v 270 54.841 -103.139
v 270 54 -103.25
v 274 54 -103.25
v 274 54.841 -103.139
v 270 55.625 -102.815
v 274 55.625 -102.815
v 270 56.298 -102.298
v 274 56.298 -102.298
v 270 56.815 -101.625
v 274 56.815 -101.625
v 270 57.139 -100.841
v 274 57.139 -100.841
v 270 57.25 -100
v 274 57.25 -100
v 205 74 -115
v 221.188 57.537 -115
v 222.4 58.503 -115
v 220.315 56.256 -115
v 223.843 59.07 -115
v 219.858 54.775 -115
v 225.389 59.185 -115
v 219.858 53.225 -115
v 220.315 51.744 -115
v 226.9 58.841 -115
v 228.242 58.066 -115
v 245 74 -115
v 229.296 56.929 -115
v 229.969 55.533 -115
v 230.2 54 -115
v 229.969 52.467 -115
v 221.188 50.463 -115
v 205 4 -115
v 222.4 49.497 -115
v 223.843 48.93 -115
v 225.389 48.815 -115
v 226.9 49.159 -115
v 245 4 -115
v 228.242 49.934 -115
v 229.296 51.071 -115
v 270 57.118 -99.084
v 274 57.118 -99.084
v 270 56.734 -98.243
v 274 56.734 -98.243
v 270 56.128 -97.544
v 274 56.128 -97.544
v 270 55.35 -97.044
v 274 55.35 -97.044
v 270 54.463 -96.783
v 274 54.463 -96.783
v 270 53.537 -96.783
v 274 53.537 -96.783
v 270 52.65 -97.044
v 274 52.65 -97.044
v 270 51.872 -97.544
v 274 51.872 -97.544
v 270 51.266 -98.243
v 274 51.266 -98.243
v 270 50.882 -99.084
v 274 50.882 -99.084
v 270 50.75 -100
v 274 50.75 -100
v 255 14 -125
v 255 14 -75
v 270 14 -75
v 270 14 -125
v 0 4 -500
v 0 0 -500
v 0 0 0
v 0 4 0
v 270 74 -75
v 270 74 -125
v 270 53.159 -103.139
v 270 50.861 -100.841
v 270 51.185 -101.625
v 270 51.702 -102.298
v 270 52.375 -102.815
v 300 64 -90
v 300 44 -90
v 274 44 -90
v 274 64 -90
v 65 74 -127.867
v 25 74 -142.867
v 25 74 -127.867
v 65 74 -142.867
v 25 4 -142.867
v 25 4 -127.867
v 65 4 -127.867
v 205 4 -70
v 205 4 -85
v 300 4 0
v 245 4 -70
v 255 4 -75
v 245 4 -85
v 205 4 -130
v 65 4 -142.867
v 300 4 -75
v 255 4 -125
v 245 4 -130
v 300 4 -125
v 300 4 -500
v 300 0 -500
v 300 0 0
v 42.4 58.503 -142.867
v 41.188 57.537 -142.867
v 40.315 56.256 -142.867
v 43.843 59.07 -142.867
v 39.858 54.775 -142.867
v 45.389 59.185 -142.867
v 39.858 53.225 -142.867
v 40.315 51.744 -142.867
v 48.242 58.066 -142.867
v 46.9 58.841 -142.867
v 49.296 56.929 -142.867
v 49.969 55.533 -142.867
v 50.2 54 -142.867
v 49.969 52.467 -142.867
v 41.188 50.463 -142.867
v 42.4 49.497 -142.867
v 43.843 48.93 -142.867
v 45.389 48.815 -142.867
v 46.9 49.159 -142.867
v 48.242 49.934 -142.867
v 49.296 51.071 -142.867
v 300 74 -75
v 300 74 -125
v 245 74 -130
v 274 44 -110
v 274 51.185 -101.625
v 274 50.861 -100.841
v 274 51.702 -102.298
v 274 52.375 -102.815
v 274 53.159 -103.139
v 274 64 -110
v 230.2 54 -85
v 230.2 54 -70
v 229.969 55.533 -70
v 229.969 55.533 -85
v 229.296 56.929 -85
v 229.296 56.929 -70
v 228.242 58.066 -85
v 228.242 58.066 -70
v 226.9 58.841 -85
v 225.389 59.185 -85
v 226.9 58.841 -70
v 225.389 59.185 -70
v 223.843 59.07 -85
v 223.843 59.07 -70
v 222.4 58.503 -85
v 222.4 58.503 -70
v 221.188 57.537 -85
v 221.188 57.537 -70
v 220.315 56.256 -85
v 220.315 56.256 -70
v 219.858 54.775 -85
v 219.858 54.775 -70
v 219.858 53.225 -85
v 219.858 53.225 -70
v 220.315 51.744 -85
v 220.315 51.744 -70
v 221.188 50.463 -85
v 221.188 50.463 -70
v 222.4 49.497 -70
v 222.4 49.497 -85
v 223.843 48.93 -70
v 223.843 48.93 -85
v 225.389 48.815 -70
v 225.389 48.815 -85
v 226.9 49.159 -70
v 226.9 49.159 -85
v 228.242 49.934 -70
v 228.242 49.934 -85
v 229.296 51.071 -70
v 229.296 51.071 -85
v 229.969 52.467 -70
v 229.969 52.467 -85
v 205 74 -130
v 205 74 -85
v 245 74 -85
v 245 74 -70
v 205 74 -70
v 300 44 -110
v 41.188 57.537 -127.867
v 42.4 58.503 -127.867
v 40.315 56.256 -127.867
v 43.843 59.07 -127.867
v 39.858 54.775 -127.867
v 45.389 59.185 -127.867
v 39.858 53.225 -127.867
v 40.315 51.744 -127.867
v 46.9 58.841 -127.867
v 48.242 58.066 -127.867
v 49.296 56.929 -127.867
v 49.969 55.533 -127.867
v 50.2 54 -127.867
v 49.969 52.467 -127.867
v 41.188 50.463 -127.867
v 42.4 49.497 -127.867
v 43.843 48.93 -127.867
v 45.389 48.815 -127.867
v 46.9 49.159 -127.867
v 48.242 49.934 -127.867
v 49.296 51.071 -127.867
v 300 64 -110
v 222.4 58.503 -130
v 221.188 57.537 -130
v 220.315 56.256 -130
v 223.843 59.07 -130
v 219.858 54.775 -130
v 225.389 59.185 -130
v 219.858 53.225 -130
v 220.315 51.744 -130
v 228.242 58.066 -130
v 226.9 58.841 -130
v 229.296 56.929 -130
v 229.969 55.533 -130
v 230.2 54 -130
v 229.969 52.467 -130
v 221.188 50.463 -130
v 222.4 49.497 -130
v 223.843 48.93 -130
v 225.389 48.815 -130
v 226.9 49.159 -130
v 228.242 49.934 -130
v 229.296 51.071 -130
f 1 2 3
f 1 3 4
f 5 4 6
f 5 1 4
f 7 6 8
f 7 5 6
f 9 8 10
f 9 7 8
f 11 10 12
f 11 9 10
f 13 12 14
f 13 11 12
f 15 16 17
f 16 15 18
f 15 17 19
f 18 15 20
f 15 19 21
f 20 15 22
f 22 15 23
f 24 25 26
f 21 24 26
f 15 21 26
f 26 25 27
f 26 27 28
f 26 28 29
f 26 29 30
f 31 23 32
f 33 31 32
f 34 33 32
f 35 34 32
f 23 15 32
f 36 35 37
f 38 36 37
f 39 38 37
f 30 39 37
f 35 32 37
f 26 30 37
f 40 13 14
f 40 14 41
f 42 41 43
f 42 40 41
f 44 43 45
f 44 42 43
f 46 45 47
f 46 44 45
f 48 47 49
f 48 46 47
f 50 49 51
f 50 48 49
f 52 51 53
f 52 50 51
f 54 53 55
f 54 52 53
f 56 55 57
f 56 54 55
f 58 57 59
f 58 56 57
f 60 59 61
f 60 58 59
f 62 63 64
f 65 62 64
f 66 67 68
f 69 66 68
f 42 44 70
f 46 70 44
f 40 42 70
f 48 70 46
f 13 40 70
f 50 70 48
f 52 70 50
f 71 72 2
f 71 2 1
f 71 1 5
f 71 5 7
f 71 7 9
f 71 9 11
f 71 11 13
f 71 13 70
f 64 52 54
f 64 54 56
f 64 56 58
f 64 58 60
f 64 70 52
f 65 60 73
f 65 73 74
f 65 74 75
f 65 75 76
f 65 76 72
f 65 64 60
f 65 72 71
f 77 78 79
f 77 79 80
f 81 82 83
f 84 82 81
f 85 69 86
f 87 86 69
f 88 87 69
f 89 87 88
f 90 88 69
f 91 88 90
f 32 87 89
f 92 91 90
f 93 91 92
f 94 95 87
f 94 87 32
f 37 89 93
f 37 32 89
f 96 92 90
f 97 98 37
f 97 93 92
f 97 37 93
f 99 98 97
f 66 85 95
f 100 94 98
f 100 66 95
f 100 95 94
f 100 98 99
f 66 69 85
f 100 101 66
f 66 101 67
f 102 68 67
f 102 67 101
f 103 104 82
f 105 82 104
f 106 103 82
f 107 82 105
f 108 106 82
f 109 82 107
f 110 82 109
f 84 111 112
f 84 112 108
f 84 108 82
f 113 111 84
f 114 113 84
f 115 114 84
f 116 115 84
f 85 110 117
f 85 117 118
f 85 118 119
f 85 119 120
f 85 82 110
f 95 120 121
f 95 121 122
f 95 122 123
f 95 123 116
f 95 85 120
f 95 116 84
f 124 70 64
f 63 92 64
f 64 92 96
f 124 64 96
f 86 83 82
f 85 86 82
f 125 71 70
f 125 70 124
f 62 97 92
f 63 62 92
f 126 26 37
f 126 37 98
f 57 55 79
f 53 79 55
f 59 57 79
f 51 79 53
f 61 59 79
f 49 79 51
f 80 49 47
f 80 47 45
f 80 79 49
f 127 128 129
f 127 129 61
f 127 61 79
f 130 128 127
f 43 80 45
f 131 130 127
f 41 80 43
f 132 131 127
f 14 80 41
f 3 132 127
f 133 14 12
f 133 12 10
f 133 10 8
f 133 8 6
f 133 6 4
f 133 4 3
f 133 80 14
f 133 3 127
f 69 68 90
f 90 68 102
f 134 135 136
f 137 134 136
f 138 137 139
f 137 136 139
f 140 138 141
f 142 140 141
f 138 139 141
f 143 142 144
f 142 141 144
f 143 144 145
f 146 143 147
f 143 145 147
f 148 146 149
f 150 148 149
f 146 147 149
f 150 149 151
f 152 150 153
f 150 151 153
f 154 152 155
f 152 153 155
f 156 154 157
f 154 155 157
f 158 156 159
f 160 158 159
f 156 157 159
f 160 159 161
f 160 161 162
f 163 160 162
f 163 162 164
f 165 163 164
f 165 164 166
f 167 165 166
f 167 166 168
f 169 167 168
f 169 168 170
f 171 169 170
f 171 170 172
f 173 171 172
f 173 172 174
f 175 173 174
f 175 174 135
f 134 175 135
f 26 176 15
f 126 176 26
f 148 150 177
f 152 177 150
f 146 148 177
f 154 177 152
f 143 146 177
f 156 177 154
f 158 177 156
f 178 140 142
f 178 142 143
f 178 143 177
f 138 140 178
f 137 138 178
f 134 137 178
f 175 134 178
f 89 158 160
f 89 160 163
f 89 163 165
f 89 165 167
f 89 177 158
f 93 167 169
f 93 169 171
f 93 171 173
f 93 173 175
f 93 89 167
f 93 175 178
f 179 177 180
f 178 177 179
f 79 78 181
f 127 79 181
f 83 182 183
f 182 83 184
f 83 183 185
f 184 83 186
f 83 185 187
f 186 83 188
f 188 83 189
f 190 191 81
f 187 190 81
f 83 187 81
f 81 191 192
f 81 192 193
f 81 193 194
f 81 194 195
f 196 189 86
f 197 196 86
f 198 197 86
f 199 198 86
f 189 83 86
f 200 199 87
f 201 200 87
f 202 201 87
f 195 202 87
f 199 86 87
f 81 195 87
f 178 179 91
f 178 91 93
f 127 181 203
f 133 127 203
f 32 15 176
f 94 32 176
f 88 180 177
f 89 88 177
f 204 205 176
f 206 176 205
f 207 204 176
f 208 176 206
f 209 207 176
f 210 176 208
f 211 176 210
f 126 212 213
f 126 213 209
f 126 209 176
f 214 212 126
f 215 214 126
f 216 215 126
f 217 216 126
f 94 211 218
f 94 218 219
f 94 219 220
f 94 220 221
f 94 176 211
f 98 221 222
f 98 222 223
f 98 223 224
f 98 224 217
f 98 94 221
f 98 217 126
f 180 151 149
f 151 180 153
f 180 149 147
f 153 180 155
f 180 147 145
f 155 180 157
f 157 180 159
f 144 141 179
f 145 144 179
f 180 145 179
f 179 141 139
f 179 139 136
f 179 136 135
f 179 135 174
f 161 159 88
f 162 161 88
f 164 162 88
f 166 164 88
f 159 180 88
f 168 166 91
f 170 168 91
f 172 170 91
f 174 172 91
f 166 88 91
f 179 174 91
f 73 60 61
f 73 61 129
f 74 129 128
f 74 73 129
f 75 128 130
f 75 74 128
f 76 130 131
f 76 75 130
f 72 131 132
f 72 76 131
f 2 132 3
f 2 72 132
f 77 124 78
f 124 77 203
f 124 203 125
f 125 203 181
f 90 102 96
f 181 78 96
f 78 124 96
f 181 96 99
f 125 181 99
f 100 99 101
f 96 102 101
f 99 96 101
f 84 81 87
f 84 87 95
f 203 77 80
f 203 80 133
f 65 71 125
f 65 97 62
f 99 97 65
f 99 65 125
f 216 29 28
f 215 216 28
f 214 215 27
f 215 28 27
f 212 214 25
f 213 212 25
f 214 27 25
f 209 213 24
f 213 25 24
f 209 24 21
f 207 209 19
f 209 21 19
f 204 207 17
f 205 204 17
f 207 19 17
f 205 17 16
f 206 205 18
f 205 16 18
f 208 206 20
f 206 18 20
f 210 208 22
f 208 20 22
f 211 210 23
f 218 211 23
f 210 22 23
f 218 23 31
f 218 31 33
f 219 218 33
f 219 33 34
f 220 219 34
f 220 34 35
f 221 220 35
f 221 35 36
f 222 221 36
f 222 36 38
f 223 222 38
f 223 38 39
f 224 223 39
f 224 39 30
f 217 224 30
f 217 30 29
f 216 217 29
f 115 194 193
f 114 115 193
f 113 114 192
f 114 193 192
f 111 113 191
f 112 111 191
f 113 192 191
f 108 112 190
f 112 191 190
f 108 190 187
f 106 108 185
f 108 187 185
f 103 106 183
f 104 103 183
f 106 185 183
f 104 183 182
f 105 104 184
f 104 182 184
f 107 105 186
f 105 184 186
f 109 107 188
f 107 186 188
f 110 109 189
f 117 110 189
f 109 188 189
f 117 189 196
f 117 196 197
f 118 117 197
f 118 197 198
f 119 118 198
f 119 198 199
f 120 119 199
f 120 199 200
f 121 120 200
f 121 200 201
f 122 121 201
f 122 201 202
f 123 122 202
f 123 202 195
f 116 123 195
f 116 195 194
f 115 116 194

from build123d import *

# Parameters (mm, degrees)
SKETCH1_W           = 150
SKETCH1_H           = 100
SKETCH1_H_2         = 400
SKETCH1_W_2         = 15
SKETCH1_H_3         = 25
SKETCH1_W_3         = 30
BOSS_EXTRUDE1_DEPTH = 4
BOSS_EXTRUDE2_START = 4
SKETCH1_4_W         = 15
SKETCH1_4_H         = 25
SKETCH1_4_W_2       = 30
BOSS_EXTRUDE2_DEPTH = 10
BOSS_EXTRUDE3_START = 14
SKETCH1_5_W         = 30
SKETCH1_5_H         = 50
BOSS_EXTRUDE3_DEPTH = 60
BOSS_EXTRUDE4_START = 4
SKETCH15_W          = 40
SKETCH15_H          = 15
BOSS_EXTRUDE4_DEPTH = 70
SKETCH16_R          = 5.2
CUT_EXTRUDE1_DEPTH  = 588.772064665
CUT_EXTRUDE2_START  = 300
SKETCH17_W          = 20
SKETCH17_H          = 20
CUT_EXTRUDE2_DEPTH  = 26
CUT_EXTRUDE3_START  = 270
CUT_EXTRUDE3_DEPTH  = 318.772064665


with BuildPart() as part:
    # Sketch1 → Boss-Extrude1 (new body)
    with BuildSketch(Plane(origin=(0, 0, 0), x_dir=(1, 0, 0), z_dir=(0, 1, 0))):
        with Locations((75, 50)):
            Rectangle(SKETCH1_W, SKETCH1_H)
        with Locations((75, 300)):
            Rectangle(SKETCH1_W, SKETCH1_H_2)
        Polygon((300, 500), (150, 500), (150, 100), (255, 100), (255, 125), (270, 125), (300, 125), align=None)
        with Locations((262.5, 112.5)):
            Rectangle(SKETCH1_W_2, SKETCH1_H_3)
        with Locations((285, 112.5)):
            Rectangle(SKETCH1_W_3, SKETCH1_H_3)
        Polygon((255, 100), (150, 100), (150, 0), (300, 0), (300, 75), (270, 75), (255, 75), align=None)
        with Locations((262.5, 87.5)):
            Rectangle(SKETCH1_W_2, SKETCH1_H_3)
        with Locations((285, 87.5)):
            Rectangle(SKETCH1_W_3, SKETCH1_H_3)
    extrude(amount=BOSS_EXTRUDE1_DEPTH)

    # Sketch1<4> → Boss-Extrude2 (add)
    with BuildSketch(Plane(origin=(0, 0, 0), x_dir=(1, 0, 0), z_dir=(0, 1, 0)).offset(BOSS_EXTRUDE2_START)):
        with Locations((262.5, 112.5)):
            Rectangle(SKETCH1_4_W, SKETCH1_4_H)
        with Locations((262.5, 87.5)):
            Rectangle(SKETCH1_4_W, SKETCH1_4_H)
        with Locations((285, 87.5)):
            Rectangle(SKETCH1_4_W_2, SKETCH1_4_H)
        with Locations((285, 112.5)):
            Rectangle(SKETCH1_4_W_2, SKETCH1_4_H)
    extrude(amount=BOSS_EXTRUDE2_DEPTH)

    # Sketch1<5> → Boss-Extrude3 (add)
    with BuildSketch(Plane(origin=(0, 0, 0), x_dir=(1, 0, 0), z_dir=(0, 1, 0)).offset(BOSS_EXTRUDE3_START)):
        with Locations((285, 100)):
            Rectangle(SKETCH1_5_W, SKETCH1_5_H)
    extrude(amount=BOSS_EXTRUDE3_DEPTH)

    # Sketch15 → Boss-Extrude4 (add)
    with BuildSketch(Plane(origin=(0, 0, 0), x_dir=(1, 0, 0), z_dir=(0, 1, 0)).offset(BOSS_EXTRUDE4_START)):
        with Locations((225, 122.5)):
            Rectangle(SKETCH15_W, SKETCH15_H)
        with Locations((225, 77.5)):
            Rectangle(SKETCH15_W, SKETCH15_H)
        with Locations((45, 135.366666062)):
            Rectangle(SKETCH15_W, SKETCH15_H)
    extrude(amount=BOSS_EXTRUDE4_DEPTH)

    # Sketch16 → Cut-Extrude1 (cut, through all)
    with BuildSketch(Plane.XY):
        with Locations((225, 54)):
            Circle(SKETCH16_R)
        with Locations((45, 54)):
            Circle(SKETCH16_R)
    extrude(amount=-CUT_EXTRUDE1_DEPTH, mode=Mode.SUBTRACT)

    # Sketch17 → Cut-Extrude2 (cut)
    with BuildSketch(Plane(origin=(0, 0, 0), x_dir=(0, 0, -1), z_dir=(1, 0, 0)).offset(CUT_EXTRUDE2_START)):
        with Locations((100, 54)):
            Rectangle(SKETCH17_W, SKETCH17_H)
    extrude(amount=-CUT_EXTRUDE2_DEPTH, mode=Mode.SUBTRACT)

    # Sketch17<3> → Cut-Extrude3 (cut, through all)
    with BuildSketch(Plane(origin=(0, 0, 0), x_dir=(0, 0, -1), z_dir=(1, 0, 0)).offset(CUT_EXTRUDE3_START)):
        with BuildLine():
            ThreePointArc((103.25, 54), (102.298097039, 56.298097039), (100, 57.25))
            Line((100, 57.25), (100, 50.75))
            ThreePointArc((100, 50.75), (102.298097039, 51.701902961), (103.25, 54))
        make_face()
        with BuildLine():
            Line((100, 50.75), (100, 57.25))
            ThreePointArc((100, 57.25), (96.75, 54), (100, 50.75))
        make_face()
    extrude(amount=CUT_EXTRUDE3_DEPTH, mode=Mode.SUBTRACT)


solid = part.part
